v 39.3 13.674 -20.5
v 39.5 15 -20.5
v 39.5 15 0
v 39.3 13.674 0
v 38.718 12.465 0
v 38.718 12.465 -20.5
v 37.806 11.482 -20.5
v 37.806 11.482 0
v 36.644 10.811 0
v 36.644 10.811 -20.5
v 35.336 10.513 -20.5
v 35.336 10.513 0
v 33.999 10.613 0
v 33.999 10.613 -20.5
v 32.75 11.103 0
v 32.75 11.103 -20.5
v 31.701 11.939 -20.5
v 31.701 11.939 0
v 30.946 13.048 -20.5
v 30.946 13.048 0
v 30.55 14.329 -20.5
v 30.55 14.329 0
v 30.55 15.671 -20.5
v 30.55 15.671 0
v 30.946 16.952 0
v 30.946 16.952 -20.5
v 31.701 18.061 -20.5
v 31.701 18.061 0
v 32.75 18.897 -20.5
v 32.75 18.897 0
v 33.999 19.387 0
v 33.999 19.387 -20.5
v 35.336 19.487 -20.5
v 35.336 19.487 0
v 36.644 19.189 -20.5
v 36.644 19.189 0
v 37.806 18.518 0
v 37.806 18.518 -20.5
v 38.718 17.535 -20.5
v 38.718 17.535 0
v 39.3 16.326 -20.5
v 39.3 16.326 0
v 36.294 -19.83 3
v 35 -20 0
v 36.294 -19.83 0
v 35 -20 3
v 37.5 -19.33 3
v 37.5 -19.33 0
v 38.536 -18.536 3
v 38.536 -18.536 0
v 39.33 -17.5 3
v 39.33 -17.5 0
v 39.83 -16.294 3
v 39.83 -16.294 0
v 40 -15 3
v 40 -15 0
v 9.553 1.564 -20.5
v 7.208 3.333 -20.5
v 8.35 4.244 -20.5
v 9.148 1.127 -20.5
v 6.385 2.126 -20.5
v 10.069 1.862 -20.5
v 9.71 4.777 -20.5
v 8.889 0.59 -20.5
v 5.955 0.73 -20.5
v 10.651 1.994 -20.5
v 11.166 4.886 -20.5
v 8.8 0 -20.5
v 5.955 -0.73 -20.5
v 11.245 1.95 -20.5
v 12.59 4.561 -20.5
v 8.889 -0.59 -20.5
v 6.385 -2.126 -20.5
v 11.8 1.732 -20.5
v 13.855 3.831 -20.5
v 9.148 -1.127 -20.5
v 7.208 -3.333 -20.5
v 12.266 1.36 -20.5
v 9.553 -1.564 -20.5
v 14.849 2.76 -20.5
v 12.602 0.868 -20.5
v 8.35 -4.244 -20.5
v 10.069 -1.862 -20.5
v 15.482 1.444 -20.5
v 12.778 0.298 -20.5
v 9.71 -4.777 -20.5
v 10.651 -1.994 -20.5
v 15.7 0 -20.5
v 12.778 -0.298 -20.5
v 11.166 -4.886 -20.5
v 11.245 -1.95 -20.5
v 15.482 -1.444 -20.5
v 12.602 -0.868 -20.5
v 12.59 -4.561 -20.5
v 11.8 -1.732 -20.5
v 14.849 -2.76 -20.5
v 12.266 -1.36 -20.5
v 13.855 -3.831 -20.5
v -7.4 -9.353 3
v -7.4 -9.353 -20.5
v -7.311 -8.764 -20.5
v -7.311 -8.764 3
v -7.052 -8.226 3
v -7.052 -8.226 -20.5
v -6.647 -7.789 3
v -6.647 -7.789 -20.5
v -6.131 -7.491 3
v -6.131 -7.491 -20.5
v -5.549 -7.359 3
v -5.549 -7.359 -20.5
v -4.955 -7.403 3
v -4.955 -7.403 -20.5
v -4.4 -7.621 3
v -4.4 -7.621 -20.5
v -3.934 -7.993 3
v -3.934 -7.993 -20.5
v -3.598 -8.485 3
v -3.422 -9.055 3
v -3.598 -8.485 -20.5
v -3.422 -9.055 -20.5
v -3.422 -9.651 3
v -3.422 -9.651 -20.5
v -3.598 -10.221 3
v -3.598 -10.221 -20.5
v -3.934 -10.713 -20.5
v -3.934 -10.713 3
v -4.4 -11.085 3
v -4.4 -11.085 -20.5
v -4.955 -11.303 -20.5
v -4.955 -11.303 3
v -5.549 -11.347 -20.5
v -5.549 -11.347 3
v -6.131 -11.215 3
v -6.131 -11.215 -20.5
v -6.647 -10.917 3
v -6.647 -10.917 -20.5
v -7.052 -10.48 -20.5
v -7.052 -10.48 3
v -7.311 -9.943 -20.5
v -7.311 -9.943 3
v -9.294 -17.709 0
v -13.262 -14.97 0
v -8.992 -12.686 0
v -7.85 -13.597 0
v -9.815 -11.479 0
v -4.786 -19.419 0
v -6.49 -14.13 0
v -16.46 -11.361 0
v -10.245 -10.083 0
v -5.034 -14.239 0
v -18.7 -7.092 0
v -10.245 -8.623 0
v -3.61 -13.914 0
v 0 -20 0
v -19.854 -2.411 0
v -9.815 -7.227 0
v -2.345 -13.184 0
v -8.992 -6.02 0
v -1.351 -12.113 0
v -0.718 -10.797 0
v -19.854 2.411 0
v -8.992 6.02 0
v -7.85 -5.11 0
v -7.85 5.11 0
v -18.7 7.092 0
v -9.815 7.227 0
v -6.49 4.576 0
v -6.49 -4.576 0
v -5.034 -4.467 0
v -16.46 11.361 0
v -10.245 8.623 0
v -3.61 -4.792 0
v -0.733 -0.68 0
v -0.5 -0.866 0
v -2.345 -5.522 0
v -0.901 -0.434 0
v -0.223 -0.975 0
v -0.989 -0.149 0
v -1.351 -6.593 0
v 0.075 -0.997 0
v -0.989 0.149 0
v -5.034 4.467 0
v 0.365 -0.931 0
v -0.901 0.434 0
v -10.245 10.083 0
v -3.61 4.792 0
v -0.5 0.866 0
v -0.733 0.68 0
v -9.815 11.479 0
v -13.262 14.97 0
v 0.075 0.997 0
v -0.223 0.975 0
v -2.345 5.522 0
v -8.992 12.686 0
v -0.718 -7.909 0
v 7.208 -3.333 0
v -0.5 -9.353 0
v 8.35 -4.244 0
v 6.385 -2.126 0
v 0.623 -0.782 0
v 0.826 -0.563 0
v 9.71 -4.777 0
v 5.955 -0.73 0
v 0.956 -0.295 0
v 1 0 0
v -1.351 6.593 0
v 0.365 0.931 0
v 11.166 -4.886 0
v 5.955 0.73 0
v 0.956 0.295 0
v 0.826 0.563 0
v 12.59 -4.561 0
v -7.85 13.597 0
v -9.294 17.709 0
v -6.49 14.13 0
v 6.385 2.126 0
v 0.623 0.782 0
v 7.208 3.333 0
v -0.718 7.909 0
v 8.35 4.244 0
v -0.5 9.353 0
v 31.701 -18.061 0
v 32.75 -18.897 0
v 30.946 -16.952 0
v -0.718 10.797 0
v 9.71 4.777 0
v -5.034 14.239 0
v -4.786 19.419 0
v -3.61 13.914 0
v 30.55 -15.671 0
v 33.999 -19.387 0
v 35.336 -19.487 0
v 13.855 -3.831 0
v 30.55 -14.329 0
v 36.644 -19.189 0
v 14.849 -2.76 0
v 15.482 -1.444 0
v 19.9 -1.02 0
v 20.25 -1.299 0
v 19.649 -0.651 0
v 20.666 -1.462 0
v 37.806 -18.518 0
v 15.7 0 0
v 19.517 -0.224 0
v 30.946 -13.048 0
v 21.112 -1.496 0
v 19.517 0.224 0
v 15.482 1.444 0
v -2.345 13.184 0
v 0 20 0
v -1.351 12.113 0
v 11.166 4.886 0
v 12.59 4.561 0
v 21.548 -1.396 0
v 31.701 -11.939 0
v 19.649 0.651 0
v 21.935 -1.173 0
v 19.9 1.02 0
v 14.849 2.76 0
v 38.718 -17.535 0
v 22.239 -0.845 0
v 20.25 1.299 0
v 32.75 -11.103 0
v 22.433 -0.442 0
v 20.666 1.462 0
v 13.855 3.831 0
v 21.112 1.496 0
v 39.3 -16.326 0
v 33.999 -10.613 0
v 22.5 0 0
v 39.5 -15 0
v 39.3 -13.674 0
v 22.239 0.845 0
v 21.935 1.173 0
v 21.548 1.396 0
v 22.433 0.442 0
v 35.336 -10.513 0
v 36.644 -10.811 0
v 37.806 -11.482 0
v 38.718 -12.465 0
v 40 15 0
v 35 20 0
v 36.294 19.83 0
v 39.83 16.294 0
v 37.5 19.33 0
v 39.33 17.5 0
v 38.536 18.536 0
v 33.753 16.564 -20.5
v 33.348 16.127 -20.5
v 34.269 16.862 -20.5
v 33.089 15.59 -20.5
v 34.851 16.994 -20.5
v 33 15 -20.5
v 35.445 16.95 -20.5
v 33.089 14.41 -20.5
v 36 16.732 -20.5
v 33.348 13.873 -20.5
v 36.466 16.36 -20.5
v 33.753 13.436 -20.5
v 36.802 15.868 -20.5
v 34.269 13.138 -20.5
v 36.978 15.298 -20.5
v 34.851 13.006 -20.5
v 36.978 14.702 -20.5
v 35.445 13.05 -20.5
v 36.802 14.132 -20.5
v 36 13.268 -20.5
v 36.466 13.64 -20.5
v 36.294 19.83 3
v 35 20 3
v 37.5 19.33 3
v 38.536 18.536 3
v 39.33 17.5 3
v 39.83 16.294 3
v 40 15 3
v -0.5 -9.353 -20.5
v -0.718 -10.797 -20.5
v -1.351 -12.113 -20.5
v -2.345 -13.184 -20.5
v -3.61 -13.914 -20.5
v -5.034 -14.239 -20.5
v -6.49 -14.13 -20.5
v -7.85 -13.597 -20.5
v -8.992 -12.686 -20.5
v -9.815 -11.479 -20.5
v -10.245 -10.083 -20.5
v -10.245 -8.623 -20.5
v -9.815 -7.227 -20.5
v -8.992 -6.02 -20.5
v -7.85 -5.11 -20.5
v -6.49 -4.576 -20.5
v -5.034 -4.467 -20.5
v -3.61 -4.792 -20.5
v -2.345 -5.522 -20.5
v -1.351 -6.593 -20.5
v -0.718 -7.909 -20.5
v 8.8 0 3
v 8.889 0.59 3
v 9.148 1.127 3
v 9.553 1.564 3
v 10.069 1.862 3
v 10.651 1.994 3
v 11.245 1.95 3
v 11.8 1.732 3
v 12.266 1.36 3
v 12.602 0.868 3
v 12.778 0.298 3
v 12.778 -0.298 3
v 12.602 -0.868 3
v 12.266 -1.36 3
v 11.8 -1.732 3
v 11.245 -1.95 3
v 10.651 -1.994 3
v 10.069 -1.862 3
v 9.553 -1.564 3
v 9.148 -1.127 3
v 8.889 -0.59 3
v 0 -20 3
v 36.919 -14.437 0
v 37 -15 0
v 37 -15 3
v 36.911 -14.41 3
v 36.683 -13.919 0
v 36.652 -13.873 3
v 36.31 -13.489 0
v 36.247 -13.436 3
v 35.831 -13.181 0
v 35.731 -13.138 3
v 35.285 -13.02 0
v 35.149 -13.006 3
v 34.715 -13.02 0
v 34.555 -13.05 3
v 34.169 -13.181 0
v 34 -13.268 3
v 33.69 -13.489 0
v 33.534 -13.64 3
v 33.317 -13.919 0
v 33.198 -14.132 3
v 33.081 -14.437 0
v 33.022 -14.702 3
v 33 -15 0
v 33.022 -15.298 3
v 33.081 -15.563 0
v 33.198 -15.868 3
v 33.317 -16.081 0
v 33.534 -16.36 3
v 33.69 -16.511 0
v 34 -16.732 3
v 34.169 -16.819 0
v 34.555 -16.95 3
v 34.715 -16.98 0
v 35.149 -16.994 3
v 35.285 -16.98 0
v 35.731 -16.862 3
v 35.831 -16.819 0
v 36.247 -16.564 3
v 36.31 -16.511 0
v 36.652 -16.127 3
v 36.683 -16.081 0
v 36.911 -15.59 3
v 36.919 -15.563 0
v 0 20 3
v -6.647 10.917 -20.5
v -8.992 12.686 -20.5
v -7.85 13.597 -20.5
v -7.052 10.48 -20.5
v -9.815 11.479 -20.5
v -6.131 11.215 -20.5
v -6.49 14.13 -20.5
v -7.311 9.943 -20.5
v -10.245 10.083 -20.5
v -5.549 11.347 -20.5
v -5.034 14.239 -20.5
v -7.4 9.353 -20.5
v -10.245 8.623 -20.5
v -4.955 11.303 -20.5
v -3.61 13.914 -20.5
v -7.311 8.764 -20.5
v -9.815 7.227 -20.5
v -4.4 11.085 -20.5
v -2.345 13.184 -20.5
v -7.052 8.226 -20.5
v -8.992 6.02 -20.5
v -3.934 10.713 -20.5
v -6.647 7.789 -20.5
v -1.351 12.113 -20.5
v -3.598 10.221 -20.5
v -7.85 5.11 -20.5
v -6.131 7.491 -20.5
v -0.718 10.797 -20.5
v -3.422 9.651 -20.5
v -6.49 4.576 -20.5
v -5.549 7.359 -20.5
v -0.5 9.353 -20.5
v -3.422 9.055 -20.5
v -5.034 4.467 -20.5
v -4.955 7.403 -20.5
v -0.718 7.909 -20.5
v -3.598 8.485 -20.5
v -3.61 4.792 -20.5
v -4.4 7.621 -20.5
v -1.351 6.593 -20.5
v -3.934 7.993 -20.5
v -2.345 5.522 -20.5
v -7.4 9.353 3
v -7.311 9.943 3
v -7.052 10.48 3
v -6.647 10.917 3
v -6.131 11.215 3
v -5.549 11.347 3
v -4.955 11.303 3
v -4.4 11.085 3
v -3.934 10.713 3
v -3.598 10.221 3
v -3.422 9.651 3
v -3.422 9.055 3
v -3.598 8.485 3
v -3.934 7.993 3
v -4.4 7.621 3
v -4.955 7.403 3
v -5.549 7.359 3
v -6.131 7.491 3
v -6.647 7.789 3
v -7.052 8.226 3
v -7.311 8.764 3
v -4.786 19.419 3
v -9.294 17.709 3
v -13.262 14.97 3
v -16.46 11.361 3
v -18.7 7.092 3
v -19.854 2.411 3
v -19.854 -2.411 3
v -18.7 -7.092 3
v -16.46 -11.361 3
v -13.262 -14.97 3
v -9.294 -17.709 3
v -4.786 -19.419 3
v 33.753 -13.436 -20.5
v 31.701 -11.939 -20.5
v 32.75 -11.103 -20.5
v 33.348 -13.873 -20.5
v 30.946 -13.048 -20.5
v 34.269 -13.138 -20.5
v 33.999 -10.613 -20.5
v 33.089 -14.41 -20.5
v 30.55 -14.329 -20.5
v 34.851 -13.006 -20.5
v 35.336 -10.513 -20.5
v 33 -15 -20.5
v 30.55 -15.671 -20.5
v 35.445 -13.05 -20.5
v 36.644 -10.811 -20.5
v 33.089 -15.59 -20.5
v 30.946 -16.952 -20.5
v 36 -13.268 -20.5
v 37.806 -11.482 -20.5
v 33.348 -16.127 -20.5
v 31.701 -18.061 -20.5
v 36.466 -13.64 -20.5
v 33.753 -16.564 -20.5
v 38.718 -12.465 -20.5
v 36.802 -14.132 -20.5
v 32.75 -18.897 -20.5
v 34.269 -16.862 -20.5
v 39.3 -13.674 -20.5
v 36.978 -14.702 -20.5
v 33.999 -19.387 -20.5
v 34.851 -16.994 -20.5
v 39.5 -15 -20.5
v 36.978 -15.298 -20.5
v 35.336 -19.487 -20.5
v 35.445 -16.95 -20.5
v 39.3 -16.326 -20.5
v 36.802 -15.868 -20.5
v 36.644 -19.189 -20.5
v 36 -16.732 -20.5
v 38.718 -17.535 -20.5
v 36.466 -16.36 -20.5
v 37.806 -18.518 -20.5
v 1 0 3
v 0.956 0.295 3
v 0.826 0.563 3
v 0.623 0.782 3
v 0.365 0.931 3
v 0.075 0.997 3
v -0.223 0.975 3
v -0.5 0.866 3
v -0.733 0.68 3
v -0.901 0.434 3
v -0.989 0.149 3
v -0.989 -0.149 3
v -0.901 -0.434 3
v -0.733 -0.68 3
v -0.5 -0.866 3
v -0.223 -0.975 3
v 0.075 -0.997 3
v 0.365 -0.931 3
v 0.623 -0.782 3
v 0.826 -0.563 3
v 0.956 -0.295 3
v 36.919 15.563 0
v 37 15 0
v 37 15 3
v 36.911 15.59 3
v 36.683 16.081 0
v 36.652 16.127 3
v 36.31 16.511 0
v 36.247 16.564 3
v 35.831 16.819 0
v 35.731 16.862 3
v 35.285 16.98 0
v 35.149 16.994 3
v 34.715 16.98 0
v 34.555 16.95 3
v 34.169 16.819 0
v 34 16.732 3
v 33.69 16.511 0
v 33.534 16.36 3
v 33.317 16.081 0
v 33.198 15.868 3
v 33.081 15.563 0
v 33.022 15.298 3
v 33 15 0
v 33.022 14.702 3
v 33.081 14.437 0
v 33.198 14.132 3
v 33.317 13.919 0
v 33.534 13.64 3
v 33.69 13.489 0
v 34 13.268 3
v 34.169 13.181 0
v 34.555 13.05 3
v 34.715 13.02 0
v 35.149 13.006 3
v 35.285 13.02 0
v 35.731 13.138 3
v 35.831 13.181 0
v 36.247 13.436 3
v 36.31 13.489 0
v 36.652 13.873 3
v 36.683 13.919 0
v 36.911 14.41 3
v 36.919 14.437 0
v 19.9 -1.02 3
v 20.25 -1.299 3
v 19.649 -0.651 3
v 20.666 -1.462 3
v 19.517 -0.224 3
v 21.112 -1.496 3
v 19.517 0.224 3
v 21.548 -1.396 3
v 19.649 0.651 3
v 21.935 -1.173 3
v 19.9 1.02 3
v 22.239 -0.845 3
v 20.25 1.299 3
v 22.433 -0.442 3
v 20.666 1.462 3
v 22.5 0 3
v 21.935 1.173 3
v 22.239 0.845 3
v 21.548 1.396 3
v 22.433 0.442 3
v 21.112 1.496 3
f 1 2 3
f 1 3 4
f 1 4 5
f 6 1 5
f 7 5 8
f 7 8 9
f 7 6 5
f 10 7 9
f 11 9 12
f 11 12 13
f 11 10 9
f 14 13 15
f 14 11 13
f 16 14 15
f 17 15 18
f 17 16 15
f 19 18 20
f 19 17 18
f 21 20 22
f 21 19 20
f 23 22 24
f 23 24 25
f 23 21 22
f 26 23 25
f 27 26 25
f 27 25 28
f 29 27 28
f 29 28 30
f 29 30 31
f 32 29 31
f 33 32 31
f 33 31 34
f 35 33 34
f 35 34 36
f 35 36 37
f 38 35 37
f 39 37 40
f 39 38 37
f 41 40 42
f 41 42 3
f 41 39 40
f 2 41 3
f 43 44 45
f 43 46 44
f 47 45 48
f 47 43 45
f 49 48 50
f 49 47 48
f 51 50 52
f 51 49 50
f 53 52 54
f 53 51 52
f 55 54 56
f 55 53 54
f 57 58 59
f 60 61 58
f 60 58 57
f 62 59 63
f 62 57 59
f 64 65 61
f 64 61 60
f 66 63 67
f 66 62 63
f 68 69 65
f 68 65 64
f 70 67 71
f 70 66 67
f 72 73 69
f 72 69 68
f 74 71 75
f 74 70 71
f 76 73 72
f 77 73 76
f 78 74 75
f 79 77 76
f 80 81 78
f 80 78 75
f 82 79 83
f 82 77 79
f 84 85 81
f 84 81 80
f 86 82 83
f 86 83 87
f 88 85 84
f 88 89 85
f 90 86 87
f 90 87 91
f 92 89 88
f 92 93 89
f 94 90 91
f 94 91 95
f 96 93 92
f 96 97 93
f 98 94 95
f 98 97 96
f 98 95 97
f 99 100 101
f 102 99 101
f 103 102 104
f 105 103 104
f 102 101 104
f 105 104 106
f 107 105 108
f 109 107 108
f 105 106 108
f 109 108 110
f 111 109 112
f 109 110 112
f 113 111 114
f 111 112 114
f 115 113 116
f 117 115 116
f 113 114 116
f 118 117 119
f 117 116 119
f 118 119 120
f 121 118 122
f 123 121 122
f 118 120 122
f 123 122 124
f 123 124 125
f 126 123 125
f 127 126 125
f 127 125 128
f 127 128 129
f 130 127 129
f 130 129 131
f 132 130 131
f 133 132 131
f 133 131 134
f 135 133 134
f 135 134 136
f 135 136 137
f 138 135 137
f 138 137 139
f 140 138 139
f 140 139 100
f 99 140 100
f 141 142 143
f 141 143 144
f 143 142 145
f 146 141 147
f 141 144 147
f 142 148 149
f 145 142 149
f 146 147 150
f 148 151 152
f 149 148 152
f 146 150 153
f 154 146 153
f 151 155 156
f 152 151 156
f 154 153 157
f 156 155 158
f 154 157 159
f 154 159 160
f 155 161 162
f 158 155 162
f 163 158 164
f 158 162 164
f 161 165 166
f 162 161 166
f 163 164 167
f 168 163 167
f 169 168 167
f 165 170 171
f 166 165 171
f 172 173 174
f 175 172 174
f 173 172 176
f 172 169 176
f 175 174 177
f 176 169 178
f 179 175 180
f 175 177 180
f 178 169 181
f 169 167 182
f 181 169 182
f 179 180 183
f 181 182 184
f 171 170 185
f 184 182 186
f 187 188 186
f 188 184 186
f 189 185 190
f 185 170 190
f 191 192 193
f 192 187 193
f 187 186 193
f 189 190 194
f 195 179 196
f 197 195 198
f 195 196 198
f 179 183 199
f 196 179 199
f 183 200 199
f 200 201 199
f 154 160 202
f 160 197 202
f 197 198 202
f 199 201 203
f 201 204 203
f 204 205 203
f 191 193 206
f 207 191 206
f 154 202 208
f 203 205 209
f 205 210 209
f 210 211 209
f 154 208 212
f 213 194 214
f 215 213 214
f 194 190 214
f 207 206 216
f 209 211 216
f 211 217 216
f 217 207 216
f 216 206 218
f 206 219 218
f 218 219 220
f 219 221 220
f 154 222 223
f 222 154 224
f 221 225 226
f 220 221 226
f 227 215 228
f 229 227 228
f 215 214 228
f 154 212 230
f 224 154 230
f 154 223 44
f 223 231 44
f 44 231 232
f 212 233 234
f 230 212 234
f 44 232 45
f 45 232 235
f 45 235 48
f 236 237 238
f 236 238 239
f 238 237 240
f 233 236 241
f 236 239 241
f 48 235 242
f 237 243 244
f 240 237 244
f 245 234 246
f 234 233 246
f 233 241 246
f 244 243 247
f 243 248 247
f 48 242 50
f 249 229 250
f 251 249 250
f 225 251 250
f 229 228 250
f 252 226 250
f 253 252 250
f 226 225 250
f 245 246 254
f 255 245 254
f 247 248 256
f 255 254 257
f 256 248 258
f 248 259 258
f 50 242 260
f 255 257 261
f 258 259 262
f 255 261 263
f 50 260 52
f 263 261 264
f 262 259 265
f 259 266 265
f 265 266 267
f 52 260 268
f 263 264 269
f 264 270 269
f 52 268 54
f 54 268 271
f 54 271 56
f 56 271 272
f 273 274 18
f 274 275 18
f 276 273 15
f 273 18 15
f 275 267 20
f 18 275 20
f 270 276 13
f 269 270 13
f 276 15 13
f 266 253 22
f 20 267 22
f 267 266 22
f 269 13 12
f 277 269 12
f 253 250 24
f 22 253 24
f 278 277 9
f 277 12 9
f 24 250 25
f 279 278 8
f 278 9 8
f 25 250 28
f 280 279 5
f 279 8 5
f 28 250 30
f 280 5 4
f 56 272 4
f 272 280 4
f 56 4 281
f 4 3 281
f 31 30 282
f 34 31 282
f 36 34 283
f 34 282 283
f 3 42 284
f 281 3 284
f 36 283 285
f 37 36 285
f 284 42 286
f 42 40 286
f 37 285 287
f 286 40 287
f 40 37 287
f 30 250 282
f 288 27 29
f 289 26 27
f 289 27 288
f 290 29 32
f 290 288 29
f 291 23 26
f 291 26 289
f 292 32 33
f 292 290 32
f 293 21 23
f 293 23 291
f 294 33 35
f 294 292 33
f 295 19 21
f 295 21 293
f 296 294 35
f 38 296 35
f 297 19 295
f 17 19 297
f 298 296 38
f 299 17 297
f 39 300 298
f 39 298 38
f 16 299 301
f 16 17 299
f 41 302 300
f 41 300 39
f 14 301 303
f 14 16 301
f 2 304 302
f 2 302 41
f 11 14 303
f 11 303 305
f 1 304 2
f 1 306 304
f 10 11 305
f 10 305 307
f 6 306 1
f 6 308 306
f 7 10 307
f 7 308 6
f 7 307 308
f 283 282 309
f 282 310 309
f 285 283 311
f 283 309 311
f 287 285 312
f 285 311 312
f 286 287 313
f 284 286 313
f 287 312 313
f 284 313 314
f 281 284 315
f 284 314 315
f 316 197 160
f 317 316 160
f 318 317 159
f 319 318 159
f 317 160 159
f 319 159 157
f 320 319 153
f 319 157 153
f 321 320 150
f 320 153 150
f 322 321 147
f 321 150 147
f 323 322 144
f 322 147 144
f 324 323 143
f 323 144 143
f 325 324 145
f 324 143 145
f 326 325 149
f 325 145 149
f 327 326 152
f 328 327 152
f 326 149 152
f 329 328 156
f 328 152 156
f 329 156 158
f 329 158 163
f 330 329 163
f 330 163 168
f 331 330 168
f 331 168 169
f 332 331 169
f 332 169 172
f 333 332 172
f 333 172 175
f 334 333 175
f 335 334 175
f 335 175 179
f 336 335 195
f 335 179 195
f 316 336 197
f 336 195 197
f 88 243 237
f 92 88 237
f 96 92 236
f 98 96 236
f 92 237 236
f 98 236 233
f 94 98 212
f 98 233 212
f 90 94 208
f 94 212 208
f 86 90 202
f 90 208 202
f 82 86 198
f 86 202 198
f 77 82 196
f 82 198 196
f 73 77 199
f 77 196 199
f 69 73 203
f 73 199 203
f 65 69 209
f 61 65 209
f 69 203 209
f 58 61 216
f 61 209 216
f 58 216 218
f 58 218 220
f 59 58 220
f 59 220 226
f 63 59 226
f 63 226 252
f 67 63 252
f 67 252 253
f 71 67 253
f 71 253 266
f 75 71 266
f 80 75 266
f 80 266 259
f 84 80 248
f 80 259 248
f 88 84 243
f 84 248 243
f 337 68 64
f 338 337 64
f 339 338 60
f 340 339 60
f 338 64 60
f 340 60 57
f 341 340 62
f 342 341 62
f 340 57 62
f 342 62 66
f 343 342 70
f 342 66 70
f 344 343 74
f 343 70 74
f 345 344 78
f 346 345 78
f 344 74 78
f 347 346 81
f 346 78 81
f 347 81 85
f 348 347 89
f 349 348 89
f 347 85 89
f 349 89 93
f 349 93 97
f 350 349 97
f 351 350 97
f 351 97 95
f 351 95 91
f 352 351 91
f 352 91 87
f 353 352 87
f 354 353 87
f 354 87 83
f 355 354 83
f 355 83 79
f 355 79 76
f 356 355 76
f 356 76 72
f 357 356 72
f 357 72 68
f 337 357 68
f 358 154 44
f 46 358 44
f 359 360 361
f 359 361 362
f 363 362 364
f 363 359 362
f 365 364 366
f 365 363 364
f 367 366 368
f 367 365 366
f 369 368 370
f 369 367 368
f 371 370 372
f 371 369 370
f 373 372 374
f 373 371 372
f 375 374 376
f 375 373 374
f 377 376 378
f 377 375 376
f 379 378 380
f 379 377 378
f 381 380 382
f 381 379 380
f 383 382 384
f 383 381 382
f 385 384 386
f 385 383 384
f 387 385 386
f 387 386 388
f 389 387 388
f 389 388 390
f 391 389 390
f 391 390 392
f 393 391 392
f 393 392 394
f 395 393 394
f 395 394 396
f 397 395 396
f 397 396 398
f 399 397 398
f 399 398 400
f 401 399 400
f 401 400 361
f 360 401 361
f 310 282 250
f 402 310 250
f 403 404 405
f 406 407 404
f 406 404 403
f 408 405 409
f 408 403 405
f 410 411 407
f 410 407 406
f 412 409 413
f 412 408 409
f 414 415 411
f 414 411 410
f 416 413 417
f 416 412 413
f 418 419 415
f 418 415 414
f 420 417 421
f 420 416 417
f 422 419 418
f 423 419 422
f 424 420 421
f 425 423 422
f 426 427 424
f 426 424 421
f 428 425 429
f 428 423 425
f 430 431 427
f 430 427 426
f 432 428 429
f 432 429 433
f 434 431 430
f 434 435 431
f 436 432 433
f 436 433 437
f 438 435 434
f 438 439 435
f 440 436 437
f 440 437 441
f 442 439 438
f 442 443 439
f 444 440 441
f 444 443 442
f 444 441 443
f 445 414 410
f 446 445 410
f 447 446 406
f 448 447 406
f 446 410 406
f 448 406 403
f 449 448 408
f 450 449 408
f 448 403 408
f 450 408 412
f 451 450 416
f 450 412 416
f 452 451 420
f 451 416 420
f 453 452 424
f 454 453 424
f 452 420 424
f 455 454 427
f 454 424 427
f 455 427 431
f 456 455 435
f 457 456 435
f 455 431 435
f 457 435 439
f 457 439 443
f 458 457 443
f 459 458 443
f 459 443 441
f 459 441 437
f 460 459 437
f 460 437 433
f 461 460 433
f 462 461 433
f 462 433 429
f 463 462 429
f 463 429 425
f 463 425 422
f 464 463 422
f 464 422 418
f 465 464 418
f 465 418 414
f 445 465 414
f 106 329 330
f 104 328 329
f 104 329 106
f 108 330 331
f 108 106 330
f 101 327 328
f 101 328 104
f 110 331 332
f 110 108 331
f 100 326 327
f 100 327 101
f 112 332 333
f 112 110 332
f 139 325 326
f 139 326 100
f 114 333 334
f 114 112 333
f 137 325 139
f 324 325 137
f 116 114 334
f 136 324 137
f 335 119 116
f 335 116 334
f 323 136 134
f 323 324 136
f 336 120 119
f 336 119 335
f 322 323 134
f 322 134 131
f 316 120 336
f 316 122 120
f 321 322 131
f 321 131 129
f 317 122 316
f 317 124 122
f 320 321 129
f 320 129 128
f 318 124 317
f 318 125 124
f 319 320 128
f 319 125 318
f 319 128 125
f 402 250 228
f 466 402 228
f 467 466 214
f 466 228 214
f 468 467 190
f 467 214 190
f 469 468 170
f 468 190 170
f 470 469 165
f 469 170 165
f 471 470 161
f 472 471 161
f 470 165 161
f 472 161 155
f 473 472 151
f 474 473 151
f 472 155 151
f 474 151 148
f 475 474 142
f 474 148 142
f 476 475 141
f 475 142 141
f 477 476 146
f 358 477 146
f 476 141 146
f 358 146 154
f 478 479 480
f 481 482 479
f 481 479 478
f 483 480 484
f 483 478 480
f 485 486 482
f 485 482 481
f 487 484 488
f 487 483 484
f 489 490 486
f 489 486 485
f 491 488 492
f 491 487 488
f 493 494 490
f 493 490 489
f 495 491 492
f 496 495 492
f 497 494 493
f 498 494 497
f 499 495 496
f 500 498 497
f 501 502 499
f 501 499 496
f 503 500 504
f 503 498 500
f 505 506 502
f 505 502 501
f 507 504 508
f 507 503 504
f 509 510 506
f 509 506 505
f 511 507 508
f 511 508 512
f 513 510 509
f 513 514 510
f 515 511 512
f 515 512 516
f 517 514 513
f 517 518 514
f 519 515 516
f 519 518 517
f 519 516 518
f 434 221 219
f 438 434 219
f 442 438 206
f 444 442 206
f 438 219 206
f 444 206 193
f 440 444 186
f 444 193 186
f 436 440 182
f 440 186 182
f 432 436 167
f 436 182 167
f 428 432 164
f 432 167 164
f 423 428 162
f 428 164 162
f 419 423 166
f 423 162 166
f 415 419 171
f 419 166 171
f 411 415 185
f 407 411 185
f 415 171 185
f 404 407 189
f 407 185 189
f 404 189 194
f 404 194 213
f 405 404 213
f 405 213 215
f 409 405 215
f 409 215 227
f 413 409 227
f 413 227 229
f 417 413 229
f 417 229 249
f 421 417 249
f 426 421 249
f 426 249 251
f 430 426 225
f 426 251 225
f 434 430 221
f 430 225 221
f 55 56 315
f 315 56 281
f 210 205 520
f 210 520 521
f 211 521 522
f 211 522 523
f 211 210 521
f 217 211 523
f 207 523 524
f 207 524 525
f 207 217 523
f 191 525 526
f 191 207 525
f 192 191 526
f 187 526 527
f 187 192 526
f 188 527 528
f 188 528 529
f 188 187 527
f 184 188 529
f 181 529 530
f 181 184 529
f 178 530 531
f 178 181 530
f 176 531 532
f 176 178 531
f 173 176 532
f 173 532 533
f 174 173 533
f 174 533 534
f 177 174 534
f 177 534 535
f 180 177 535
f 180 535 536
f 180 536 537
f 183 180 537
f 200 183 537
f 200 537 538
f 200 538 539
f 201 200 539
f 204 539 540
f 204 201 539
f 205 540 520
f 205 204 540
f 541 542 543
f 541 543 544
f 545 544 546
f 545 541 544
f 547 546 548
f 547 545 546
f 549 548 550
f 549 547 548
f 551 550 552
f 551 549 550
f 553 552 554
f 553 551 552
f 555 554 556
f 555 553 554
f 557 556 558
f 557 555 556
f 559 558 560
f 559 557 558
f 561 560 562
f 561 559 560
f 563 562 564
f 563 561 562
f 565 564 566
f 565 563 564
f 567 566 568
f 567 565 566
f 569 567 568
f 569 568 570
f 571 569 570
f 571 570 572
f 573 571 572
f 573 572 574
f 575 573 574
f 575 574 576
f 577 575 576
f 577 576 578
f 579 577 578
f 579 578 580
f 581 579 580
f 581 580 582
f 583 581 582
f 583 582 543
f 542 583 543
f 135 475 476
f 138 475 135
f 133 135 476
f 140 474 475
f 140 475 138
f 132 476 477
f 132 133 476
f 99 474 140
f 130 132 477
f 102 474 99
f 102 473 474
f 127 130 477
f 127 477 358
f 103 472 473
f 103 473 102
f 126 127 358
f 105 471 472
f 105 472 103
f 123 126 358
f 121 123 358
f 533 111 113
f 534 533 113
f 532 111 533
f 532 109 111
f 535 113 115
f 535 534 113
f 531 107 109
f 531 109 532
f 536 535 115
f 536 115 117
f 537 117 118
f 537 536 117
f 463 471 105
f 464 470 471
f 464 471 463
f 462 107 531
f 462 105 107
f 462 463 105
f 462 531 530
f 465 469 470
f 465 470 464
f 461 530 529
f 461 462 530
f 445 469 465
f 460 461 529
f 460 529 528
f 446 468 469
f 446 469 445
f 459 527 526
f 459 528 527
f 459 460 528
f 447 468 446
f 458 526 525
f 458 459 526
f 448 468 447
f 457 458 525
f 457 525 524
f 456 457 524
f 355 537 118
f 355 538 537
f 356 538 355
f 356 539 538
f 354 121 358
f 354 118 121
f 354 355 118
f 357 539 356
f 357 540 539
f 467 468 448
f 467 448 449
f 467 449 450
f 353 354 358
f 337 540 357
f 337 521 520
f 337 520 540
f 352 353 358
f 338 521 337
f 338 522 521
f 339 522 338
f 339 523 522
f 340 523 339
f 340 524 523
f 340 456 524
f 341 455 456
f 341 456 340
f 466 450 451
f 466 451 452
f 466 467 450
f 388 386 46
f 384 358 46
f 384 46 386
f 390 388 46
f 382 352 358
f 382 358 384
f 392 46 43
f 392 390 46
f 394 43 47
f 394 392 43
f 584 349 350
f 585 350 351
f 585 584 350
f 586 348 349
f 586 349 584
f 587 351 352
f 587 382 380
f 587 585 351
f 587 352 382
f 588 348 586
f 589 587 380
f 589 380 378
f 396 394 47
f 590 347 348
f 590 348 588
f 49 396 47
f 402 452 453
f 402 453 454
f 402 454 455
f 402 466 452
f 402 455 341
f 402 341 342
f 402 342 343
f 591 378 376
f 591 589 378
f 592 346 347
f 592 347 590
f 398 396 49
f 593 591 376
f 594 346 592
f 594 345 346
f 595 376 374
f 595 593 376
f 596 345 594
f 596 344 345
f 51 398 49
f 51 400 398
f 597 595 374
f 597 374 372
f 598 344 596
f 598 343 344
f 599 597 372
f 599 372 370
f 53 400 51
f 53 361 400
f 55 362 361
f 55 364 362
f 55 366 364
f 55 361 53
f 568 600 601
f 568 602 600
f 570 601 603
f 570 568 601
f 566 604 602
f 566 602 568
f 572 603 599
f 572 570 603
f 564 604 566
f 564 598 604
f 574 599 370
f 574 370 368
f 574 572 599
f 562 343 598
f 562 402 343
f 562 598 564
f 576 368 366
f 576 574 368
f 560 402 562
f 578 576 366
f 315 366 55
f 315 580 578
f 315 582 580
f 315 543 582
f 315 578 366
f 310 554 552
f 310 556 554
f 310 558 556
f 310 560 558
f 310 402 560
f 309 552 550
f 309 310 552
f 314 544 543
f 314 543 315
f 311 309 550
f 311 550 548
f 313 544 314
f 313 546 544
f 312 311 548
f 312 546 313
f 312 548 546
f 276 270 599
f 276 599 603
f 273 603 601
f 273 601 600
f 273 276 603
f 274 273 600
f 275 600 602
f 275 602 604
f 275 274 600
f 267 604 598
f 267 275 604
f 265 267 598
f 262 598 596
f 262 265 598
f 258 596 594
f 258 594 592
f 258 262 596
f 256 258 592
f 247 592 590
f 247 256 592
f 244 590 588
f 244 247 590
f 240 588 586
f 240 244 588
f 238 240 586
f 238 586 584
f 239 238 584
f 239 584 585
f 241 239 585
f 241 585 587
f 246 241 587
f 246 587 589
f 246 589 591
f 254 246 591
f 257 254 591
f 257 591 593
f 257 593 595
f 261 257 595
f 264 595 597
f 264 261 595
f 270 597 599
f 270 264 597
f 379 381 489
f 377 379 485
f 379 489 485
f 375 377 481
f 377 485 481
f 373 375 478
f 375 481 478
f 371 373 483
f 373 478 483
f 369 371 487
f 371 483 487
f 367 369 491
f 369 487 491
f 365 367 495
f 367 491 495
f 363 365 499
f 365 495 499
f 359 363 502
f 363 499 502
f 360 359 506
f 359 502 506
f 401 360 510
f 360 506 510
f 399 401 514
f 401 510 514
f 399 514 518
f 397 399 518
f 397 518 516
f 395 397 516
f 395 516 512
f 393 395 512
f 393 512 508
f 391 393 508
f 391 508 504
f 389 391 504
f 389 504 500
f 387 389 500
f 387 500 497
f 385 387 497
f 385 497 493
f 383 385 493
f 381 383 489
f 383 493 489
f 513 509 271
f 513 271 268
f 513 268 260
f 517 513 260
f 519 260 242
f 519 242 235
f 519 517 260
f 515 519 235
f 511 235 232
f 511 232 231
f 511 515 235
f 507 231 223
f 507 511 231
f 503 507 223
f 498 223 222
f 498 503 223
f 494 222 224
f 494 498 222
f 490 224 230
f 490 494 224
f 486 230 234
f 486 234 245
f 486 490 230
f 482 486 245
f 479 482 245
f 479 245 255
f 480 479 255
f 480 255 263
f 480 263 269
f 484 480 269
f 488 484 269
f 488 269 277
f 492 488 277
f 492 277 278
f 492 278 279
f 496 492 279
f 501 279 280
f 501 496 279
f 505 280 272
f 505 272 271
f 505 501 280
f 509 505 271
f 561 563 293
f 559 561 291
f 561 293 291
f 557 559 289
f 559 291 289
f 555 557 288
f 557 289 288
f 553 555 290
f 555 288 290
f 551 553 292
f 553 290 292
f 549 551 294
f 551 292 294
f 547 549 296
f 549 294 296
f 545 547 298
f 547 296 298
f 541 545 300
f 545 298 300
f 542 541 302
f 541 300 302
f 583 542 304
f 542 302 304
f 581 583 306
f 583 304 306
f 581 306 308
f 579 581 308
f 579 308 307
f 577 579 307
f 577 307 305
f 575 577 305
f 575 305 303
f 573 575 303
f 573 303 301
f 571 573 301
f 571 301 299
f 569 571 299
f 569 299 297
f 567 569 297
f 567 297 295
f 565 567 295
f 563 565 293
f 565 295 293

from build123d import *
from build123d.topology import SkipClean

# Parameters (mm, degrees)
SKIZZE1_R                       = 1.5
SKIZZE1_R_2                     = 1
SKIZZE1_R_3                     = 2
AUFSATZ_LINEAR_AUSTRAGEN1_DEPTH = 3
SKIZZE2_R                       = 4.9
AUFSATZ_LINEAR_AUSTRAGEN2_DEPTH = 20.5
SKIZZE3_R                       = 2
SCHNITT_LINEAR_AUSTRAGEN1_DEPTH = 51.519798099
VERRUNDUNG1_R                   = 5
AUFSATZ_LINEAR_START            = 20.5
SKIZZE4_R                       = 4.5
SKIZZE4_R_2                     = 2
AUFSATZ_LINEAR_AUSTRAGEN3_DEPTH = 20.5


with BuildPart() as part:
    # Skizze1 → Aufsatz-Linear austragen1 (new body)
    with BuildSketch(Plane.XY):
        with BuildLine():
            ThreePointArc((0, 20), (-20, 0), (0, -20))
            Line((0, -20), (40, -20))
            Line((40, -20), (40, 20))
            Line((40, 20), (0, 20))
        make_face()
        with Locations((21, 0)):
            Circle(SKIZZE1_R, mode=Mode.SUBTRACT)
        Circle(SKIZZE1_R_2, mode=Mode.SUBTRACT)
        with Locations((35, 15)):
            Circle(SKIZZE1_R_3, mode=Mode.SUBTRACT)
        with Locations((35, -15)):
            Circle(SKIZZE1_R_3, mode=Mode.SUBTRACT)
    extrude(amount=AUFSATZ_LINEAR_AUSTRAGEN1_DEPTH)

    # Skizze2 → Aufsatz-Linear austragen2 (add)
    with BuildSketch(Plane(origin=(0, 0, 0), x_dir=(-1, 0, 0), z_dir=(0, 0, -1))):
        with Locations(Location((-10.8, 0, 0), (0, 0, 180))):
            Circle(SKIZZE2_R)
        with Locations(Location((5.4, 9.353074361, 0), (0, 0, 180))):
            Circle(SKIZZE2_R)
        with Locations(Location((5.4, -9.353074361, 0), (0, 0, 180))):
            Circle(SKIZZE2_R)
    extrude(amount=AUFSATZ_LINEAR_AUSTRAGEN2_DEPTH)

    # Skizze3 → Schnitt-Linear austragen1 (cut, through all)
    with BuildSketch(Plane(origin=(0, 0, -20.5), x_dir=(-1, 0, 0), z_dir=(0, 0, -1))):
        with Locations((-10.8, 0)):
            Circle(SKIZZE3_R)
        with Locations((5.4, 9.353074361)):
            Circle(SKIZZE3_R)
        with Locations((5.4, -9.353074361)):
            Circle(SKIZZE3_R)
    extrude(amount=-SCHNITT_LINEAR_AUSTRAGEN1_DEPTH, mode=Mode.SUBTRACT)

    # Verrundung1
    verrundung1_edges = [part.edges().sort_by_distance(p)[0] for p in [
        (40, 20, 1.5),
        (40, -20, 1.5),
    ]]
    fillet(verrundung1_edges, radius=VERRUNDUNG1_R)

    # Skizze4 → Aufsatz-Linear austragen3 (add)
    # profile 1 of 2: a face of its own
    with SkipClean():  # the faces are left unmerged after this step: merging them gives an invalid solid
        with BuildSketch(Plane(origin=(0, 0, 0), x_dir=(-1, 0, 0), z_dir=(0, 0, -1)).offset(AUFSATZ_LINEAR_START)):
            with Locations(Location((-35, 15, 0), (0, 0, 180))):
                Circle(SKIZZE4_R)
            with Locations((-35, 15)):
                Circle(SKIZZE4_R_2, mode=Mode.SUBTRACT)
        # profile 2 of 2: a face of its own
        with BuildSketch(Plane(origin=(0, 0, 0), x_dir=(-1, 0, 0), z_dir=(0, 0, -1)).offset(AUFSATZ_LINEAR_START)):
            with Locations(Location((-35, -15, 0), (0, 0, 180))):
                Circle(SKIZZE4_R)
            with Locations((-35, -15)):
                Circle(SKIZZE4_R_2, mode=Mode.SUBTRACT)
        extrude(amount=-AUFSATZ_LINEAR_AUSTRAGEN3_DEPTH)


solid = part.part
